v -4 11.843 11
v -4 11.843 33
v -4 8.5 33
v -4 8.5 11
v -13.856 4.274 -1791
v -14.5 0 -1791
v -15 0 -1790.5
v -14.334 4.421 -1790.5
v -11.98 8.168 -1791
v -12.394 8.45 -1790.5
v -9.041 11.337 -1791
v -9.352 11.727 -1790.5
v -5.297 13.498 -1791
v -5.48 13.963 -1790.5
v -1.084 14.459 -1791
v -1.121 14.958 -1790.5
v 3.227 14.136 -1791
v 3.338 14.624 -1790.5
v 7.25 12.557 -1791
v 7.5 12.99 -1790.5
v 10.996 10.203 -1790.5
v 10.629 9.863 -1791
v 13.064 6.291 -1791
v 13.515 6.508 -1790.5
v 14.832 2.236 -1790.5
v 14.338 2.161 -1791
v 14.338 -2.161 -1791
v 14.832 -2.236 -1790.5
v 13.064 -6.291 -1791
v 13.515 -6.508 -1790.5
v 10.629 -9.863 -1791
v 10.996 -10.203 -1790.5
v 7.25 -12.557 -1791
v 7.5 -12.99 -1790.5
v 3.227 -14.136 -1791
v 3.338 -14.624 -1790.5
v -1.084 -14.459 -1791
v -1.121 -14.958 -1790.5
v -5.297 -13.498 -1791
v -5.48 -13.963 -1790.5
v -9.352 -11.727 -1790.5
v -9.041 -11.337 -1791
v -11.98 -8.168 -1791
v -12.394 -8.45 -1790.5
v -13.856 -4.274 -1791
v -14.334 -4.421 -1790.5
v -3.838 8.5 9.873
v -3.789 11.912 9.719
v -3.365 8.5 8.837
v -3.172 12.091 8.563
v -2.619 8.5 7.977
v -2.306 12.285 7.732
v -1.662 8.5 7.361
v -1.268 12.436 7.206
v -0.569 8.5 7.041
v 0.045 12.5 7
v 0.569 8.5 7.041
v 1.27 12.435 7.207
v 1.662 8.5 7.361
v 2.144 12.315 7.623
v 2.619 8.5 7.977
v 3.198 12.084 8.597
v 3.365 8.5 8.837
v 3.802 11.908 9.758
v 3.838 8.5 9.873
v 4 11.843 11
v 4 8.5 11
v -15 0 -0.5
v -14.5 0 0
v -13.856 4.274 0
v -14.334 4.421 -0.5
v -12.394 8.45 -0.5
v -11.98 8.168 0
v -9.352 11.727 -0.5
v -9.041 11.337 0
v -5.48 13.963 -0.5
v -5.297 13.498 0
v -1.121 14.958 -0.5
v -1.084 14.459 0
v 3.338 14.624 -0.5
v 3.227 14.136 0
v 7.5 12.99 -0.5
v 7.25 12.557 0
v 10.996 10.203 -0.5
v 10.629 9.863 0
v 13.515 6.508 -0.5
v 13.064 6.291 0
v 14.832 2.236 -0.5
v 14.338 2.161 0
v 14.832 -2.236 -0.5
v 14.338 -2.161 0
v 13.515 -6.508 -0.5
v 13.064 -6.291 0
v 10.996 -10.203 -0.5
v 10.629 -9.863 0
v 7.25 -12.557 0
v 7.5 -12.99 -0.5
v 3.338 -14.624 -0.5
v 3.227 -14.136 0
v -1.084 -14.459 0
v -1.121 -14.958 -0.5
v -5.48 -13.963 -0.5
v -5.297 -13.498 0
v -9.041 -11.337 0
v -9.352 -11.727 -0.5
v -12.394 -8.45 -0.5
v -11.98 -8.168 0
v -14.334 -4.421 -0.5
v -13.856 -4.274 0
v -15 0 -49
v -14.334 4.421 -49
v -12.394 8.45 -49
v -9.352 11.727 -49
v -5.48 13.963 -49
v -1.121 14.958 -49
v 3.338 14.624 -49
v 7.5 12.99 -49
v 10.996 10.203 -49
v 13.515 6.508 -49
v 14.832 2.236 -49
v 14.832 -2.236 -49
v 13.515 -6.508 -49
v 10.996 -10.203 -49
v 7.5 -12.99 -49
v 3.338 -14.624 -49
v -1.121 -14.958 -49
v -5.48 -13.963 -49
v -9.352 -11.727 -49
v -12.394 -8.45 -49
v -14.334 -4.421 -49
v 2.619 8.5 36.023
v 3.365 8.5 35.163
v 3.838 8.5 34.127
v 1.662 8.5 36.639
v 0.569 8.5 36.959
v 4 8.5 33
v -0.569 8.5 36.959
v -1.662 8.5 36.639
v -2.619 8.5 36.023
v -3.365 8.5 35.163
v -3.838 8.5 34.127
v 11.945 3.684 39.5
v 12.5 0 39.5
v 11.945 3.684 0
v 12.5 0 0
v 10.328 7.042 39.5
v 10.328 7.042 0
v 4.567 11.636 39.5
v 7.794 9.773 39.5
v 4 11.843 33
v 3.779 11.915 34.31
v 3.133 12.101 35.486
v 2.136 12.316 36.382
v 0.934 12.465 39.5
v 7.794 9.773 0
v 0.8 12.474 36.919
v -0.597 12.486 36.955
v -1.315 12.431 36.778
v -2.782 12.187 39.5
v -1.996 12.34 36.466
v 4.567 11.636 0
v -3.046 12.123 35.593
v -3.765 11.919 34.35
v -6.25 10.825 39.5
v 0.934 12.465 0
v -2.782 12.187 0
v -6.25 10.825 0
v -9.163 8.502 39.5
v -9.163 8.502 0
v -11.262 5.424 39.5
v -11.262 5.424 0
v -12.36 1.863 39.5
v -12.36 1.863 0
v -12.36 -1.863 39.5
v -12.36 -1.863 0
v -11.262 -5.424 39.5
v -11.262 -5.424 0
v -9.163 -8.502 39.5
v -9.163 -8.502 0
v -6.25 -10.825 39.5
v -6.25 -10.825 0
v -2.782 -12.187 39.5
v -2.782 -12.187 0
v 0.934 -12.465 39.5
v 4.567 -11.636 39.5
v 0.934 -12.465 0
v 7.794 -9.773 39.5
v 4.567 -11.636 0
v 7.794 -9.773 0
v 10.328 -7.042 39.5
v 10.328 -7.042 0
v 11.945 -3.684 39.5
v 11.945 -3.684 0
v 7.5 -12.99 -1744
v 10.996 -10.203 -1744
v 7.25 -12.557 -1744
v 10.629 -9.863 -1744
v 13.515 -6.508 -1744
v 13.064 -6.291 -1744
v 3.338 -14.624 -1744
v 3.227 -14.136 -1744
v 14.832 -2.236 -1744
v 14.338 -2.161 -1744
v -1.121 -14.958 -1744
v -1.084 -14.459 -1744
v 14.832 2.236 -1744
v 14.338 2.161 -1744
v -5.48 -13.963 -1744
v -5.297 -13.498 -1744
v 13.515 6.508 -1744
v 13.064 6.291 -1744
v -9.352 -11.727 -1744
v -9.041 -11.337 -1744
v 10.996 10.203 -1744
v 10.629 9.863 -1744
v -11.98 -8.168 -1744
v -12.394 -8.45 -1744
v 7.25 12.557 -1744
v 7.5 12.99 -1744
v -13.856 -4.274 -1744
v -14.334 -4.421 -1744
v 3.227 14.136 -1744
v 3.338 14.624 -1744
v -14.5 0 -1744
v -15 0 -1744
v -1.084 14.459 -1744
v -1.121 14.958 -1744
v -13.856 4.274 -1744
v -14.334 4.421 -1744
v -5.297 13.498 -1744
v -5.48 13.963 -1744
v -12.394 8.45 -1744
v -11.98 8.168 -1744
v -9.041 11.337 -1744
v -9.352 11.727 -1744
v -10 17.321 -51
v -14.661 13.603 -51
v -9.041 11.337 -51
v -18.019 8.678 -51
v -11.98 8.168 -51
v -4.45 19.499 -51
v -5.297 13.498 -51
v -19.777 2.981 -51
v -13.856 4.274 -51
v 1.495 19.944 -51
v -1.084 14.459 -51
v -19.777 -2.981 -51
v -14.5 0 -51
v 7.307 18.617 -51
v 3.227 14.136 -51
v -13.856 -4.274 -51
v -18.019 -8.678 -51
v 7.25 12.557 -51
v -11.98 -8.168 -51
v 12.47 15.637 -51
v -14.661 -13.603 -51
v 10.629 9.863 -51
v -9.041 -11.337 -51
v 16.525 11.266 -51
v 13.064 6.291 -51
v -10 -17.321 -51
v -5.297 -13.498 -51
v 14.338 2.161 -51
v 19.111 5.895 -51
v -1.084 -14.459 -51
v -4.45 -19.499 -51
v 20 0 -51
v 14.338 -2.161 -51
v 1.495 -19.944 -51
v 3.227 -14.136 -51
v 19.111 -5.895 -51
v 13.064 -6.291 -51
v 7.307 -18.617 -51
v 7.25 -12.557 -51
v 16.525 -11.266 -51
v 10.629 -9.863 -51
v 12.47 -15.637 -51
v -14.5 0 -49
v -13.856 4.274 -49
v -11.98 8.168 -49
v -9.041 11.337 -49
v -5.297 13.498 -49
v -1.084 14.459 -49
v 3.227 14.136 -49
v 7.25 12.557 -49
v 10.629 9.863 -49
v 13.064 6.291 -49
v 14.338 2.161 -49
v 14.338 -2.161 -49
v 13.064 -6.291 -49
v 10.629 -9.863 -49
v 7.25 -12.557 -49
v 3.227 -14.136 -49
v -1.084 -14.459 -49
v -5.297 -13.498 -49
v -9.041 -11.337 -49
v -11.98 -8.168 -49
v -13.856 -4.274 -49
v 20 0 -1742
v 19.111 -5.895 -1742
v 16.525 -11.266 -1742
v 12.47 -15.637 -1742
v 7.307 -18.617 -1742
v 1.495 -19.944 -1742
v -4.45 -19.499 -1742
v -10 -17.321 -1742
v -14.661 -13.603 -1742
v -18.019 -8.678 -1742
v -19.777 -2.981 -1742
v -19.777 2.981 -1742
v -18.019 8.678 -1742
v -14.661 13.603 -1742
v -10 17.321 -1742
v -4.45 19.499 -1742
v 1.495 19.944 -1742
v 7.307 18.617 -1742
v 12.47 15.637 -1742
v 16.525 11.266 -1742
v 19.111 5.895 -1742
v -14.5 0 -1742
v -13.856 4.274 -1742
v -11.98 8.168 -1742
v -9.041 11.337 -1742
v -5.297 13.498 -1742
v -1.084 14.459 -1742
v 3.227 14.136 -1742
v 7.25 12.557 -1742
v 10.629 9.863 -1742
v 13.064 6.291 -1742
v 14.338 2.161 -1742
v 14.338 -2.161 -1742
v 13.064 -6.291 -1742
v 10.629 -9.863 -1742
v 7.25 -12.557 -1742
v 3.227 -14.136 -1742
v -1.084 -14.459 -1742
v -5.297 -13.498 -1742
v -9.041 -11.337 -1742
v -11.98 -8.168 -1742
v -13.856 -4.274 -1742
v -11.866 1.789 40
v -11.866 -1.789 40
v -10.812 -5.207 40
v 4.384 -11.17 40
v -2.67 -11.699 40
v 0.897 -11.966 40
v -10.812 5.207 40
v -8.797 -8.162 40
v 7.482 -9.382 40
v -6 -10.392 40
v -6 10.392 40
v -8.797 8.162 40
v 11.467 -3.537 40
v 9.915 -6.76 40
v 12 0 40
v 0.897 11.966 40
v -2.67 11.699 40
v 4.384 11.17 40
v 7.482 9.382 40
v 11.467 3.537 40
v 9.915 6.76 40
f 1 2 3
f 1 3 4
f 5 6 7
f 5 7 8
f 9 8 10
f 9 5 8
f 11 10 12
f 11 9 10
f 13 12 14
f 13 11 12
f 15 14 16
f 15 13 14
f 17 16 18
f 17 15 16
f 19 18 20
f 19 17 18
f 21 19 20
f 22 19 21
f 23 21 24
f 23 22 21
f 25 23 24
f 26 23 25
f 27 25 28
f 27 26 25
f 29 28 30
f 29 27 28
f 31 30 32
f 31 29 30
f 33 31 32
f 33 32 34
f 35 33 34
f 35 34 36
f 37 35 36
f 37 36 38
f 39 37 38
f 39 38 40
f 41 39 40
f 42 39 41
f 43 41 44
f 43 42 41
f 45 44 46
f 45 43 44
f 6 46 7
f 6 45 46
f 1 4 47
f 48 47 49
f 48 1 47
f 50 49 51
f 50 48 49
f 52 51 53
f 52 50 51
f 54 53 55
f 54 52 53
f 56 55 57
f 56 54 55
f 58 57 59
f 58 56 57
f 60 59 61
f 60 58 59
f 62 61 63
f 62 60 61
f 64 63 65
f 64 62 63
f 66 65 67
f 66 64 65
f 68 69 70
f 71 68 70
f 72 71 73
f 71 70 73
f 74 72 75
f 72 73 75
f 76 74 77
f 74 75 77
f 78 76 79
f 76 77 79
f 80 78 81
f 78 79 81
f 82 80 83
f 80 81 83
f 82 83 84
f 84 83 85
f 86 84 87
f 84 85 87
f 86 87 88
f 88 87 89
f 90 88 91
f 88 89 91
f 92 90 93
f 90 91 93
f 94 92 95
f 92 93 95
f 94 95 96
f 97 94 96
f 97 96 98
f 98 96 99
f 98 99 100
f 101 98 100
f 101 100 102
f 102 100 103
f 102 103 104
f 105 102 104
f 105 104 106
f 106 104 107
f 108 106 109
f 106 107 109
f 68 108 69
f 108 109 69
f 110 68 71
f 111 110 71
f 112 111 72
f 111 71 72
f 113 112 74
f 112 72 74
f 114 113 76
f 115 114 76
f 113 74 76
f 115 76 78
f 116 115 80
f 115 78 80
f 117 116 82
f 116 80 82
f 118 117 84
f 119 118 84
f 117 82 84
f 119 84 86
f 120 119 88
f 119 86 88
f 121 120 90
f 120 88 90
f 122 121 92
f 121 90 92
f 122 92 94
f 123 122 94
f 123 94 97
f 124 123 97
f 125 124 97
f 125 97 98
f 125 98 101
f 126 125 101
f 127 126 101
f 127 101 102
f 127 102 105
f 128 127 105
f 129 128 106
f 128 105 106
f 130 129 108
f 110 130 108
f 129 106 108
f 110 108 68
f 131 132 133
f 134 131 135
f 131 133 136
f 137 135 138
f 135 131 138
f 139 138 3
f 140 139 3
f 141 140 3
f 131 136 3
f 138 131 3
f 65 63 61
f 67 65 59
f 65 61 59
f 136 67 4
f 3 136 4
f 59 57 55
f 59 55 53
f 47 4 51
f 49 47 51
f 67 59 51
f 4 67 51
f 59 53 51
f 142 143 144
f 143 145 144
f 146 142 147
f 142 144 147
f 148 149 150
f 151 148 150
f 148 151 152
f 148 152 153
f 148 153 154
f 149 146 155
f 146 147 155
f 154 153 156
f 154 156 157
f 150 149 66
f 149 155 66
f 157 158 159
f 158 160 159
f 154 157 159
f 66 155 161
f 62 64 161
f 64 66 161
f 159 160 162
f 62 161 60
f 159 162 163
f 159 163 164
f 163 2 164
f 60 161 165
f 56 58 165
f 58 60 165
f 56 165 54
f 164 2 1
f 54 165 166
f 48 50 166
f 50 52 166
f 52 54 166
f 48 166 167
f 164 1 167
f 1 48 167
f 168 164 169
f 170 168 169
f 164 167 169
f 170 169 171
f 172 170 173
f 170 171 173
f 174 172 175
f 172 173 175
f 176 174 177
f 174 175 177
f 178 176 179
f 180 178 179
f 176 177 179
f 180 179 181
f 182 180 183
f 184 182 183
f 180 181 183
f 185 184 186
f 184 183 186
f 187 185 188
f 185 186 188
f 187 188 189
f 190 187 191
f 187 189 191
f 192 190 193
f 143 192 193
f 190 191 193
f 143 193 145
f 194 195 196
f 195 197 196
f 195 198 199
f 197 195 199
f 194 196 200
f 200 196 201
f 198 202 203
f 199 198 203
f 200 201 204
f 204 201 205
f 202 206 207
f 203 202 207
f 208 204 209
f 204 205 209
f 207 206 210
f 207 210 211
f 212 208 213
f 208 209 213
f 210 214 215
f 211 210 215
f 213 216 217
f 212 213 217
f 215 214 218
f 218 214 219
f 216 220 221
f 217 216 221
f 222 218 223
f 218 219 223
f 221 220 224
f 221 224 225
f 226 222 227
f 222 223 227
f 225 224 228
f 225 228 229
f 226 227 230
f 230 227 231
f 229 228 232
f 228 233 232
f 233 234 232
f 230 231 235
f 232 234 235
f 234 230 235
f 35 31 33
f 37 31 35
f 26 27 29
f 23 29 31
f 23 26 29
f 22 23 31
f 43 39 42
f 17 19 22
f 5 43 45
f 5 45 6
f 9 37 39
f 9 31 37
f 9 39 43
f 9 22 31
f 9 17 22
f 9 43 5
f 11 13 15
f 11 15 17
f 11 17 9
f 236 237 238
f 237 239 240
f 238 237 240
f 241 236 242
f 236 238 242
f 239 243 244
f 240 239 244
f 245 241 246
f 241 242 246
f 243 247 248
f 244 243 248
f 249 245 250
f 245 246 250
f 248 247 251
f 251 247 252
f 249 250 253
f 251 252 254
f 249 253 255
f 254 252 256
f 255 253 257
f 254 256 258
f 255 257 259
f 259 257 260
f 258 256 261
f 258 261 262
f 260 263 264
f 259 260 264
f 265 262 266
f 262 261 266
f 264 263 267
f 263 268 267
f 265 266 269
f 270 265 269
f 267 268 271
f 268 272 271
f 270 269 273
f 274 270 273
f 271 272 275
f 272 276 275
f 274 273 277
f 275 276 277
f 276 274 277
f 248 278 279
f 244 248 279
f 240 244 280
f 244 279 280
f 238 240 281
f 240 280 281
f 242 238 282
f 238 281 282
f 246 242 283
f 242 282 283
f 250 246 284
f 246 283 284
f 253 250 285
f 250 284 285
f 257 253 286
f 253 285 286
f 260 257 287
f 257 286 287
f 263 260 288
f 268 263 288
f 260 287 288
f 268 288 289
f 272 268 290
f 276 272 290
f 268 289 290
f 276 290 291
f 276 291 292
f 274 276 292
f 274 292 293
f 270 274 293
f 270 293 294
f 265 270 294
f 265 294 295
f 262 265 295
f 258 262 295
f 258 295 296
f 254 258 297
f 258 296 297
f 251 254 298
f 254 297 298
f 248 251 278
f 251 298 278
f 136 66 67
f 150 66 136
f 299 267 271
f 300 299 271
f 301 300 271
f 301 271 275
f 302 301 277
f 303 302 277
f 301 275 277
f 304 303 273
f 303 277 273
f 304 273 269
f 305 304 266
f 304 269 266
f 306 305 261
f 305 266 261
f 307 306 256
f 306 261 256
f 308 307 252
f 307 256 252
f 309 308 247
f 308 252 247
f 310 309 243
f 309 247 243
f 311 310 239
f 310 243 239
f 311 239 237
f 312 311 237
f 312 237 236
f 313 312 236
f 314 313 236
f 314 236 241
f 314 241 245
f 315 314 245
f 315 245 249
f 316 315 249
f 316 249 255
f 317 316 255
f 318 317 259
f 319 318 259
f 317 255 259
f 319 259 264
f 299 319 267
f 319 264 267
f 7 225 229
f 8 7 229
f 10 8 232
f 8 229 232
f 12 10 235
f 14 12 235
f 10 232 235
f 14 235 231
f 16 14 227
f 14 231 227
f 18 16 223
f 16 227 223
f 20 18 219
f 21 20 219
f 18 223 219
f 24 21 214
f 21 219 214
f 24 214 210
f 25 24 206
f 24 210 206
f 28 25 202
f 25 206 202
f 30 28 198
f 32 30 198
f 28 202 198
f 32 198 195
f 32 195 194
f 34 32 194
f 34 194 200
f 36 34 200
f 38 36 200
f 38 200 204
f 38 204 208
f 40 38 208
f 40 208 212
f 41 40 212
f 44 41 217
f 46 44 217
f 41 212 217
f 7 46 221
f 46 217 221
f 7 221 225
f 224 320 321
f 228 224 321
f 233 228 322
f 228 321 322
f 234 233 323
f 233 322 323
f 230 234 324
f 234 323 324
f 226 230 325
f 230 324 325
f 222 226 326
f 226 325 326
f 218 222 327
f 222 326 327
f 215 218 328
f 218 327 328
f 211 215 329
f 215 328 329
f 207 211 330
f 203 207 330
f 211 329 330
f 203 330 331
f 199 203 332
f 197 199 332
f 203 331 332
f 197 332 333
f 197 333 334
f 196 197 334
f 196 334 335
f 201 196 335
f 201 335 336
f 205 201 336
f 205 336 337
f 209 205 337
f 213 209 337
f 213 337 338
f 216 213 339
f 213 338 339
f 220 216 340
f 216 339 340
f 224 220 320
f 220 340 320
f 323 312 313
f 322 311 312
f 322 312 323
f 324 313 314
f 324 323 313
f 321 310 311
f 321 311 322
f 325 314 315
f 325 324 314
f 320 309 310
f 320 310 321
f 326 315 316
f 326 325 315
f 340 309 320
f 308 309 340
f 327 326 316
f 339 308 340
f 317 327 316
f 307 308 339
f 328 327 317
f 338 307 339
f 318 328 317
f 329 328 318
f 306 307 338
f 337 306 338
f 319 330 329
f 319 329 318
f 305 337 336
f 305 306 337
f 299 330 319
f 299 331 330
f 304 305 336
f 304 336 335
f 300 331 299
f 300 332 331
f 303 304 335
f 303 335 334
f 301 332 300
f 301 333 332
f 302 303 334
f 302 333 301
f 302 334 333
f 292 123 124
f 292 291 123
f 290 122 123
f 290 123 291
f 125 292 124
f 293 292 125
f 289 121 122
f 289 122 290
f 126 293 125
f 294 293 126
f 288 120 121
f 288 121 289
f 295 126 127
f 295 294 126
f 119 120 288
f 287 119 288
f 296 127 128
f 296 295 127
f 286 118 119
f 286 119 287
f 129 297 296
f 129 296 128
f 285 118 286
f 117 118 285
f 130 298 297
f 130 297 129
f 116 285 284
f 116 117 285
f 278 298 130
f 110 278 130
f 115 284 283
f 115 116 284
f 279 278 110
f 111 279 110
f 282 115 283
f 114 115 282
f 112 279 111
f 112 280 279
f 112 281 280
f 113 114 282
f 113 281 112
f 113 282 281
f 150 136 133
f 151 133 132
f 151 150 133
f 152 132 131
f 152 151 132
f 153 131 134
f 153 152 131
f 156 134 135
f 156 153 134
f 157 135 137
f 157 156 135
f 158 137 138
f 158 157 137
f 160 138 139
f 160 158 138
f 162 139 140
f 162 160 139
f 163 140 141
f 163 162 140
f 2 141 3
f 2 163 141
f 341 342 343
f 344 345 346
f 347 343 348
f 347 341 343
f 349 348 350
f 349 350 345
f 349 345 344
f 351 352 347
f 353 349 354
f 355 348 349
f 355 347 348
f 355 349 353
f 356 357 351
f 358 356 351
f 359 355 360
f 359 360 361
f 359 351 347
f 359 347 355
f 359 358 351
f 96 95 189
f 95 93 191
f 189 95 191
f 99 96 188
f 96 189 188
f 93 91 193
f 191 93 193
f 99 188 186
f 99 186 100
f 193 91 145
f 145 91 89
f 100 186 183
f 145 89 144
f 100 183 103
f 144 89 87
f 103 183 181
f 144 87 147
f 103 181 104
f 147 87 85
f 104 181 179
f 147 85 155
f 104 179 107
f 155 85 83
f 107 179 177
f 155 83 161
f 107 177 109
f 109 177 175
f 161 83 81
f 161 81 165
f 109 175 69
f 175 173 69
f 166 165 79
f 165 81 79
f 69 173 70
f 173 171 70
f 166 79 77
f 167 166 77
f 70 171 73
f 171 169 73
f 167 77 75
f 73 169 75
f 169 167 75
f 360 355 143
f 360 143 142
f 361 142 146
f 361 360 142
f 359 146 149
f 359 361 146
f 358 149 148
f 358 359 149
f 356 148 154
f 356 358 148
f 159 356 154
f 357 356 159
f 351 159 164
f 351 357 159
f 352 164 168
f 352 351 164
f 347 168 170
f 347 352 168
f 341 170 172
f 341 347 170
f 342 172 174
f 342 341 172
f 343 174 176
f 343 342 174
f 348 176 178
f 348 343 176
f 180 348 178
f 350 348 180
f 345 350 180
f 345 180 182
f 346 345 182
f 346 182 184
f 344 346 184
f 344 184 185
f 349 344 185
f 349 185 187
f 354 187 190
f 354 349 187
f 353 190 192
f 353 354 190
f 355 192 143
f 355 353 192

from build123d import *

# Parameters (mm, degrees)
SKETCH_1_R          = 12.5
EXTRUDE_1_DEPTH     = 40
CHAMFER_1_SIZE      = 0.5
SKETCH_2_R          = 15
EXTRUDE_2_DEPTH     = 49
CHAMFER_2_SIZE      = 0.5
CUT_EXTRUDE_1_DEPTH = 4
SKETCH_11_R         = 14.5
EXTRUDE_3_DEPTH     = 2
SKETCH_12_R         = 20
EXTRUDE_4_DEPTH     = 1691
SKETCH_13_R         = 14.5
EXTRUDE_5_DEPTH     = 2
SKETCH_14_R         = 15
EXTRUDE_6_DEPTH     = 47
CHAMFER_3_SIZE      = 0.5


with BuildPart() as part:
    # 草图1 → 凸台-拉伸1 (new body)
    with BuildSketch(Plane.XY):
        Circle(SKETCH_1_R)
    extrude(amount=EXTRUDE_1_DEPTH)

    # 倒角1
    chamfer_1_edges = [part.edges().sort_by_distance(p)[0] for p in [
        (-12.5, 0, 40),
    ]]
    chamfer(chamfer_1_edges, length=CHAMFER_1_SIZE)

    # 草图2 → 凸台-拉伸2 (add)
    with BuildSketch(Plane(origin=(0, 0, 0), x_dir=(-1, 0, 0), z_dir=(0, 0, -1))):
        Circle(SKETCH_2_R)
    extrude(amount=EXTRUDE_2_DEPTH)

    # 倒角2
    chamfer_2_edges = [part.edges().sort_by_distance(p)[0] for p in [
        (15, 0, 0),
    ]]
    chamfer(chamfer_2_edges, length=CHAMFER_2_SIZE)

    # 草图5 → 切除-拉伸1 (cut)
    with BuildSketch(Plane(origin=(0, 12.5, 0), x_dir=(1, 0, 0), z_dir=(0, 1, 0))):
        with BuildLine():
            Line((-4, -33), (-4, -11))
            ThreePointArc((-4, -11), (0, -7), (4, -11))
            Line((4, -11), (4, -33))
            ThreePointArc((4, -33), (0, -37), (-4, -33))
        make_face()
    extrude(amount=-CUT_EXTRUDE_1_DEPTH, mode=Mode.SUBTRACT)

    # 草图11 → 凸台-拉伸3 (add)
    with BuildSketch(Plane(origin=(0, 0, -49), x_dir=(-1, 0, 0), z_dir=(0, 0, -1))):
        Circle(SKETCH_11_R)
    extrude(amount=EXTRUDE_3_DEPTH)

    # 草图12 → 凸台-拉伸4 (add)
    with BuildSketch(Plane(origin=(0, 0, -51), x_dir=(-1, 0, 0), z_dir=(0, 0, -1))):
        Circle(SKETCH_12_R)
    extrude(amount=EXTRUDE_4_DEPTH)

    # 草图13 → 凸台-拉伸5 (add)
    with BuildSketch(Plane(origin=(0, 0, -1742), x_dir=(-1, 0, 0), z_dir=(0, 0, -1))):
        Circle(SKETCH_13_R)
    extrude(amount=EXTRUDE_5_DEPTH)

    # 草图14 → 凸台-拉伸6 (add)
    with BuildSketch(Plane(origin=(0, 0, -1744), x_dir=(-1, 0, 0), z_dir=(0, 0, -1))):
        Circle(SKETCH_14_R)
    extrude(amount=EXTRUDE_6_DEPTH)

    # 倒角3
    chamfer_3_edges = [part.edges().sort_by_distance(p)[0] for p in [
        (15, 0, -1791),
    ]]
    chamfer(chamfer_3_edges, length=CHAMFER_3_SIZE)


solid = part.part
